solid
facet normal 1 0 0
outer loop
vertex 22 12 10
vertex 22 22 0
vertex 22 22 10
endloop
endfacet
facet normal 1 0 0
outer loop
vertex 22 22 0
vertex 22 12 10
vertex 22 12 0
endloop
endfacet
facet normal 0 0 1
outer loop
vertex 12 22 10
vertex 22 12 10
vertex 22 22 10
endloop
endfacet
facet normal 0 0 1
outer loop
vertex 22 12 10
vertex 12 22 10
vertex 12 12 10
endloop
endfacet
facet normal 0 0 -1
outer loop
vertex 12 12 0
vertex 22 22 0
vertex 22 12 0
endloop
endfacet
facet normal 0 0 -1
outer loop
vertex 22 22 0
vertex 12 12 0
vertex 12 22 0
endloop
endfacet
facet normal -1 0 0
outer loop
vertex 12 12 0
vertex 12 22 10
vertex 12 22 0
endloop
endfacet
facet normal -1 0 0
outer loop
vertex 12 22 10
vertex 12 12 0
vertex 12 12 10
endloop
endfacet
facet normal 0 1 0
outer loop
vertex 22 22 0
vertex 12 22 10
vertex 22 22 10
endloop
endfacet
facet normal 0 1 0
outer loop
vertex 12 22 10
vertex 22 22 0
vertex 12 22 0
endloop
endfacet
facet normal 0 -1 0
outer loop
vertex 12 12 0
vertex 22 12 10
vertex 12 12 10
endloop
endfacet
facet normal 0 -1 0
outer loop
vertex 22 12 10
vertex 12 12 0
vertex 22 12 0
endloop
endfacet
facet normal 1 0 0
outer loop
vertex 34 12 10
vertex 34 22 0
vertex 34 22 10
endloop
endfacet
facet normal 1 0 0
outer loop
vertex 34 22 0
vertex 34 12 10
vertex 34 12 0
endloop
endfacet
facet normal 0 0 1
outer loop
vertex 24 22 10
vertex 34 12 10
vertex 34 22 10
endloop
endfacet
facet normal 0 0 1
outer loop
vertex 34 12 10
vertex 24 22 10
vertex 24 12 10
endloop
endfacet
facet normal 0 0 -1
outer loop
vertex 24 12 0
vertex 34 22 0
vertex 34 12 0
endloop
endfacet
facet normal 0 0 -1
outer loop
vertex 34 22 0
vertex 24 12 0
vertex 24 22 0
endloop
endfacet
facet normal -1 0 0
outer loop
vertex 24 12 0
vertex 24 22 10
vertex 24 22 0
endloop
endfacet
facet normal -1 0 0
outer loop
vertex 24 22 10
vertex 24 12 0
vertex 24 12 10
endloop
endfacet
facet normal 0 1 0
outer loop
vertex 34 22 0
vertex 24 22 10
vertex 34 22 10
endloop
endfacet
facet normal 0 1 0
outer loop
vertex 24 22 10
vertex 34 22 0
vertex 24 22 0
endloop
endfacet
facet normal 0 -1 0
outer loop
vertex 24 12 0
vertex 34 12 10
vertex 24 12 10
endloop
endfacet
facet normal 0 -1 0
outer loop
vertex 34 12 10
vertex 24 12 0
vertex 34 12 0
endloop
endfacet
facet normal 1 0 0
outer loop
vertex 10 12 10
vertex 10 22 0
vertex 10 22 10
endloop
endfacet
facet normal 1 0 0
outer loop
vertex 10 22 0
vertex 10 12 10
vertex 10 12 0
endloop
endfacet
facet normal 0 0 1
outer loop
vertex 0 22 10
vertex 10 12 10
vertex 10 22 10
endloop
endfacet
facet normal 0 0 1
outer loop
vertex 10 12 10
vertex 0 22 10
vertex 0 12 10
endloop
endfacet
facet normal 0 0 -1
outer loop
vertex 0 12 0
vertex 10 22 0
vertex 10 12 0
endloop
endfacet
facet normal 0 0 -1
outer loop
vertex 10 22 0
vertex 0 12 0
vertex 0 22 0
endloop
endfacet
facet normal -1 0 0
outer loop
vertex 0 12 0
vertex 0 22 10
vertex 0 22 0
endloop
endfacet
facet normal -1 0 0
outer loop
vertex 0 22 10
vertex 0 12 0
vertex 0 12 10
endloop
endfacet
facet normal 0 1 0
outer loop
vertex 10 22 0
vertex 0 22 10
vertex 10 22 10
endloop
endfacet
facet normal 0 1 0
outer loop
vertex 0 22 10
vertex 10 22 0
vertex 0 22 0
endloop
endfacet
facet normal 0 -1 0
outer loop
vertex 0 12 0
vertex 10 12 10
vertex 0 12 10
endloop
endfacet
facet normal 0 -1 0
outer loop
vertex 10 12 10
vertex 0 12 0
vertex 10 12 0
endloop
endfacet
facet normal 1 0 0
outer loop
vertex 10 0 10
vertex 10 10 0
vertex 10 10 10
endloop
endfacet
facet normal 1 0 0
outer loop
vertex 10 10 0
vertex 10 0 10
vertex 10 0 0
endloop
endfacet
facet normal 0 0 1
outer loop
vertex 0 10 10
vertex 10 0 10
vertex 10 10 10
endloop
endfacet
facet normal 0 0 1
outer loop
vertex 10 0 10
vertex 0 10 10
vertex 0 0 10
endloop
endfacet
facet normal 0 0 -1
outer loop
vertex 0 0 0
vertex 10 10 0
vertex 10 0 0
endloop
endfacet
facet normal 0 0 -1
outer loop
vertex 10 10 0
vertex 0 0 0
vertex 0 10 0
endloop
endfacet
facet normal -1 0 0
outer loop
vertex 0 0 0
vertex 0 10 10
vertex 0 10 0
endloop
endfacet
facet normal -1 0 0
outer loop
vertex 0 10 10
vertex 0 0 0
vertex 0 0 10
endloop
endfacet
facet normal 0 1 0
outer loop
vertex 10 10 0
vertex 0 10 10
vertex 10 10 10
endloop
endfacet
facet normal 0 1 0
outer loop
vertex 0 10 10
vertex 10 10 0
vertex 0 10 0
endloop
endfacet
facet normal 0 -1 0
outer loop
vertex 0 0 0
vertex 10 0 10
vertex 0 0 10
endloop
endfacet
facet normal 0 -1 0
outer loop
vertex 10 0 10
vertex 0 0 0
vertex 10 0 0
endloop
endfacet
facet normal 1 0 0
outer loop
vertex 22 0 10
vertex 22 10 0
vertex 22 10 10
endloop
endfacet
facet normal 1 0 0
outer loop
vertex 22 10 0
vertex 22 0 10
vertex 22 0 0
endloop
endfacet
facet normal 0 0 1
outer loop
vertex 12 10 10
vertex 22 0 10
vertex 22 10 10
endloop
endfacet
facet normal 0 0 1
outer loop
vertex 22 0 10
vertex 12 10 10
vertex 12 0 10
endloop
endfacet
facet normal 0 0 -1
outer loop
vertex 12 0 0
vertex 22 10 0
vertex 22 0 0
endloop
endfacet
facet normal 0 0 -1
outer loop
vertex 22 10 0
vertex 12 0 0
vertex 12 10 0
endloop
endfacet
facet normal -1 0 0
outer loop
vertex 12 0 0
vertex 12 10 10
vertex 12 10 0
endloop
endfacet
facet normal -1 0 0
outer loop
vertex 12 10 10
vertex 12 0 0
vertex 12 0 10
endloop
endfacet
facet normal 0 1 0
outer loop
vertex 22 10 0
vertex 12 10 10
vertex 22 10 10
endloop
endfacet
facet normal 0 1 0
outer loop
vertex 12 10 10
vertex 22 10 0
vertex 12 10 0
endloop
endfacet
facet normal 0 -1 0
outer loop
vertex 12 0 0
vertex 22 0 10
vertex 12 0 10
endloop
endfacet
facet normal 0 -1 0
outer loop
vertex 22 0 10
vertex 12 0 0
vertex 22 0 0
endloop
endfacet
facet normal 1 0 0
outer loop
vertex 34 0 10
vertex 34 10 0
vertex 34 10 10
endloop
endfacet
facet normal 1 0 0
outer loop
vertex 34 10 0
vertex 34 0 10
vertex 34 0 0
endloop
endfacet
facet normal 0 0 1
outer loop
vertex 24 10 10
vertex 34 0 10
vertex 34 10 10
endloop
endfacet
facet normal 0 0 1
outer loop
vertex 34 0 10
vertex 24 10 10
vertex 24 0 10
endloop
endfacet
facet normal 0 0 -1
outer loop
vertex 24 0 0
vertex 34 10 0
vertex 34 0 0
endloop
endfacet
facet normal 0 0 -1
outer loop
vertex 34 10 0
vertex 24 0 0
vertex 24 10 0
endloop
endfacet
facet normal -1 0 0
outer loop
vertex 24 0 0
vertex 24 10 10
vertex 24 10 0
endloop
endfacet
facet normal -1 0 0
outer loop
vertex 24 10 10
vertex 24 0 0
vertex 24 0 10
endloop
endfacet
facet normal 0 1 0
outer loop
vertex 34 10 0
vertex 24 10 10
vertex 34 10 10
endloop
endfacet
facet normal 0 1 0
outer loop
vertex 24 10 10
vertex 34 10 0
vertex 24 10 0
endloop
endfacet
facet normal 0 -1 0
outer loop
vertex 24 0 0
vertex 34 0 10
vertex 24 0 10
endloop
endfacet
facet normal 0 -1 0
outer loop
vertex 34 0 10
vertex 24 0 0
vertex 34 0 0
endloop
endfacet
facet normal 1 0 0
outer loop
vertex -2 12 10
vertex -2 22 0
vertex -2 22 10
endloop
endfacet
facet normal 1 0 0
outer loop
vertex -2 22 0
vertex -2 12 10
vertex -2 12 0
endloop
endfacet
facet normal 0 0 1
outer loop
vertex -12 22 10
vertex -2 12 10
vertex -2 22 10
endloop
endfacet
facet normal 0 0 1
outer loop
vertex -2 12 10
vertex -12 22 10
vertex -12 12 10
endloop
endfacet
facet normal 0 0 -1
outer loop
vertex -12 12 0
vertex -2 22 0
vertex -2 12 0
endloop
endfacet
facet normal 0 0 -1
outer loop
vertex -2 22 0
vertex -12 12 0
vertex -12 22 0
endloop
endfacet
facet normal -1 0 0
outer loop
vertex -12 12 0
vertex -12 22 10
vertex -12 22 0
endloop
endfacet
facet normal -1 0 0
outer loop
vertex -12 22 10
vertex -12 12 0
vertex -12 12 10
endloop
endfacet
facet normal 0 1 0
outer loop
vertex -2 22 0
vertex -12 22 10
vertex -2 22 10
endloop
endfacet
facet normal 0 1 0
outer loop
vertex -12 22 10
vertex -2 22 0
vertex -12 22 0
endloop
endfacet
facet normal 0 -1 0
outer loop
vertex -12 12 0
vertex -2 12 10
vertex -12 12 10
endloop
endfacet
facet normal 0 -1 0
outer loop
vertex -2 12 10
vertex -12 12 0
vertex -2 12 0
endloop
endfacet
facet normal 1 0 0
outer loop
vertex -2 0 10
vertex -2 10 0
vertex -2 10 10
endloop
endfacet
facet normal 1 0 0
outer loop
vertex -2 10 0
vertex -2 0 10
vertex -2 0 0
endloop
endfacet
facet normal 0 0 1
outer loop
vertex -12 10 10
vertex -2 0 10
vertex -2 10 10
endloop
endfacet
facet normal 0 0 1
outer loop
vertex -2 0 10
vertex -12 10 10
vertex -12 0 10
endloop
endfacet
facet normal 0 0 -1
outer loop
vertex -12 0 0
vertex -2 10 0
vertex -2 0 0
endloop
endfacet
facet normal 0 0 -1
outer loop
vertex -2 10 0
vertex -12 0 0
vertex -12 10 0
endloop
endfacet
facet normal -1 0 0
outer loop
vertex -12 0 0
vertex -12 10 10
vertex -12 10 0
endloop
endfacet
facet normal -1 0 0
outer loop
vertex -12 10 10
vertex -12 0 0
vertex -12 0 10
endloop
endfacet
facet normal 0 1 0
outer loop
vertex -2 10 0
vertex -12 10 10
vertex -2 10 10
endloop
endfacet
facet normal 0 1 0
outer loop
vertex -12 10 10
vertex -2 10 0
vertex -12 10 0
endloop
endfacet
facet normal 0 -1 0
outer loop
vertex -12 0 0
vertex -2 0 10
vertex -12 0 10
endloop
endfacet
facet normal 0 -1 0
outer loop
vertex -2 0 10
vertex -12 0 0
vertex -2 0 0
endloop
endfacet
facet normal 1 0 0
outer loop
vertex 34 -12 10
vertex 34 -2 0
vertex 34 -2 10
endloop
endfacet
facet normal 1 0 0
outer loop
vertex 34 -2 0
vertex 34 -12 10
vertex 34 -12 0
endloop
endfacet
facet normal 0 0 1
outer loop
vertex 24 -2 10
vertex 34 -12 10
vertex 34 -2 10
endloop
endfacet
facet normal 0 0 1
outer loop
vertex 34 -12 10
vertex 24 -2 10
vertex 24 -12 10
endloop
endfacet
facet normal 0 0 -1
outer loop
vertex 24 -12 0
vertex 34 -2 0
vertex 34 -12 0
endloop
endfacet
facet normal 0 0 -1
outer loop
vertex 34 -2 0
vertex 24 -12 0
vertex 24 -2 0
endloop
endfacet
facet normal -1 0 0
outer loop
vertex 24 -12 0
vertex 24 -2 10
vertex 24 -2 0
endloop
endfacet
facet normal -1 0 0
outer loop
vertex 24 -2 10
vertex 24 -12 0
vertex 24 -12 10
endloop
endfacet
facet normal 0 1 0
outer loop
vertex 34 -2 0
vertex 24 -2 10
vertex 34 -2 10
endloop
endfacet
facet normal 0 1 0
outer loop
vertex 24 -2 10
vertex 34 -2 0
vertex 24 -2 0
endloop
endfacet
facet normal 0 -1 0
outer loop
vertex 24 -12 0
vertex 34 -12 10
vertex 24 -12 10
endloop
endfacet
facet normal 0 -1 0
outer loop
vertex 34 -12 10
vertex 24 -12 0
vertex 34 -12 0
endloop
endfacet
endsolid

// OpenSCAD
// Volume: 9000, SurfaceArea: 5400
// Empty
color();
// No children
color() { }

module object() cube([10,10,10]);

translate([12,12,0]) object();
color([1,0,0]) translate([24,12,0]) object();
translate([0,12,0]) color("Purple") object();
color([0,0,1,0.5]) object();
translate([12,0,0]) color([0,0,1],0.5) object();
translate([24,0,0]) color(c="Green",alpha=0.2) object();
translate([-12,12,0]) color() object();
translate([-12,0,0]) color(alpha=0.5) object();
translate([24,-12,0]) color([1,0,0]) color([0,0,1]) object();
